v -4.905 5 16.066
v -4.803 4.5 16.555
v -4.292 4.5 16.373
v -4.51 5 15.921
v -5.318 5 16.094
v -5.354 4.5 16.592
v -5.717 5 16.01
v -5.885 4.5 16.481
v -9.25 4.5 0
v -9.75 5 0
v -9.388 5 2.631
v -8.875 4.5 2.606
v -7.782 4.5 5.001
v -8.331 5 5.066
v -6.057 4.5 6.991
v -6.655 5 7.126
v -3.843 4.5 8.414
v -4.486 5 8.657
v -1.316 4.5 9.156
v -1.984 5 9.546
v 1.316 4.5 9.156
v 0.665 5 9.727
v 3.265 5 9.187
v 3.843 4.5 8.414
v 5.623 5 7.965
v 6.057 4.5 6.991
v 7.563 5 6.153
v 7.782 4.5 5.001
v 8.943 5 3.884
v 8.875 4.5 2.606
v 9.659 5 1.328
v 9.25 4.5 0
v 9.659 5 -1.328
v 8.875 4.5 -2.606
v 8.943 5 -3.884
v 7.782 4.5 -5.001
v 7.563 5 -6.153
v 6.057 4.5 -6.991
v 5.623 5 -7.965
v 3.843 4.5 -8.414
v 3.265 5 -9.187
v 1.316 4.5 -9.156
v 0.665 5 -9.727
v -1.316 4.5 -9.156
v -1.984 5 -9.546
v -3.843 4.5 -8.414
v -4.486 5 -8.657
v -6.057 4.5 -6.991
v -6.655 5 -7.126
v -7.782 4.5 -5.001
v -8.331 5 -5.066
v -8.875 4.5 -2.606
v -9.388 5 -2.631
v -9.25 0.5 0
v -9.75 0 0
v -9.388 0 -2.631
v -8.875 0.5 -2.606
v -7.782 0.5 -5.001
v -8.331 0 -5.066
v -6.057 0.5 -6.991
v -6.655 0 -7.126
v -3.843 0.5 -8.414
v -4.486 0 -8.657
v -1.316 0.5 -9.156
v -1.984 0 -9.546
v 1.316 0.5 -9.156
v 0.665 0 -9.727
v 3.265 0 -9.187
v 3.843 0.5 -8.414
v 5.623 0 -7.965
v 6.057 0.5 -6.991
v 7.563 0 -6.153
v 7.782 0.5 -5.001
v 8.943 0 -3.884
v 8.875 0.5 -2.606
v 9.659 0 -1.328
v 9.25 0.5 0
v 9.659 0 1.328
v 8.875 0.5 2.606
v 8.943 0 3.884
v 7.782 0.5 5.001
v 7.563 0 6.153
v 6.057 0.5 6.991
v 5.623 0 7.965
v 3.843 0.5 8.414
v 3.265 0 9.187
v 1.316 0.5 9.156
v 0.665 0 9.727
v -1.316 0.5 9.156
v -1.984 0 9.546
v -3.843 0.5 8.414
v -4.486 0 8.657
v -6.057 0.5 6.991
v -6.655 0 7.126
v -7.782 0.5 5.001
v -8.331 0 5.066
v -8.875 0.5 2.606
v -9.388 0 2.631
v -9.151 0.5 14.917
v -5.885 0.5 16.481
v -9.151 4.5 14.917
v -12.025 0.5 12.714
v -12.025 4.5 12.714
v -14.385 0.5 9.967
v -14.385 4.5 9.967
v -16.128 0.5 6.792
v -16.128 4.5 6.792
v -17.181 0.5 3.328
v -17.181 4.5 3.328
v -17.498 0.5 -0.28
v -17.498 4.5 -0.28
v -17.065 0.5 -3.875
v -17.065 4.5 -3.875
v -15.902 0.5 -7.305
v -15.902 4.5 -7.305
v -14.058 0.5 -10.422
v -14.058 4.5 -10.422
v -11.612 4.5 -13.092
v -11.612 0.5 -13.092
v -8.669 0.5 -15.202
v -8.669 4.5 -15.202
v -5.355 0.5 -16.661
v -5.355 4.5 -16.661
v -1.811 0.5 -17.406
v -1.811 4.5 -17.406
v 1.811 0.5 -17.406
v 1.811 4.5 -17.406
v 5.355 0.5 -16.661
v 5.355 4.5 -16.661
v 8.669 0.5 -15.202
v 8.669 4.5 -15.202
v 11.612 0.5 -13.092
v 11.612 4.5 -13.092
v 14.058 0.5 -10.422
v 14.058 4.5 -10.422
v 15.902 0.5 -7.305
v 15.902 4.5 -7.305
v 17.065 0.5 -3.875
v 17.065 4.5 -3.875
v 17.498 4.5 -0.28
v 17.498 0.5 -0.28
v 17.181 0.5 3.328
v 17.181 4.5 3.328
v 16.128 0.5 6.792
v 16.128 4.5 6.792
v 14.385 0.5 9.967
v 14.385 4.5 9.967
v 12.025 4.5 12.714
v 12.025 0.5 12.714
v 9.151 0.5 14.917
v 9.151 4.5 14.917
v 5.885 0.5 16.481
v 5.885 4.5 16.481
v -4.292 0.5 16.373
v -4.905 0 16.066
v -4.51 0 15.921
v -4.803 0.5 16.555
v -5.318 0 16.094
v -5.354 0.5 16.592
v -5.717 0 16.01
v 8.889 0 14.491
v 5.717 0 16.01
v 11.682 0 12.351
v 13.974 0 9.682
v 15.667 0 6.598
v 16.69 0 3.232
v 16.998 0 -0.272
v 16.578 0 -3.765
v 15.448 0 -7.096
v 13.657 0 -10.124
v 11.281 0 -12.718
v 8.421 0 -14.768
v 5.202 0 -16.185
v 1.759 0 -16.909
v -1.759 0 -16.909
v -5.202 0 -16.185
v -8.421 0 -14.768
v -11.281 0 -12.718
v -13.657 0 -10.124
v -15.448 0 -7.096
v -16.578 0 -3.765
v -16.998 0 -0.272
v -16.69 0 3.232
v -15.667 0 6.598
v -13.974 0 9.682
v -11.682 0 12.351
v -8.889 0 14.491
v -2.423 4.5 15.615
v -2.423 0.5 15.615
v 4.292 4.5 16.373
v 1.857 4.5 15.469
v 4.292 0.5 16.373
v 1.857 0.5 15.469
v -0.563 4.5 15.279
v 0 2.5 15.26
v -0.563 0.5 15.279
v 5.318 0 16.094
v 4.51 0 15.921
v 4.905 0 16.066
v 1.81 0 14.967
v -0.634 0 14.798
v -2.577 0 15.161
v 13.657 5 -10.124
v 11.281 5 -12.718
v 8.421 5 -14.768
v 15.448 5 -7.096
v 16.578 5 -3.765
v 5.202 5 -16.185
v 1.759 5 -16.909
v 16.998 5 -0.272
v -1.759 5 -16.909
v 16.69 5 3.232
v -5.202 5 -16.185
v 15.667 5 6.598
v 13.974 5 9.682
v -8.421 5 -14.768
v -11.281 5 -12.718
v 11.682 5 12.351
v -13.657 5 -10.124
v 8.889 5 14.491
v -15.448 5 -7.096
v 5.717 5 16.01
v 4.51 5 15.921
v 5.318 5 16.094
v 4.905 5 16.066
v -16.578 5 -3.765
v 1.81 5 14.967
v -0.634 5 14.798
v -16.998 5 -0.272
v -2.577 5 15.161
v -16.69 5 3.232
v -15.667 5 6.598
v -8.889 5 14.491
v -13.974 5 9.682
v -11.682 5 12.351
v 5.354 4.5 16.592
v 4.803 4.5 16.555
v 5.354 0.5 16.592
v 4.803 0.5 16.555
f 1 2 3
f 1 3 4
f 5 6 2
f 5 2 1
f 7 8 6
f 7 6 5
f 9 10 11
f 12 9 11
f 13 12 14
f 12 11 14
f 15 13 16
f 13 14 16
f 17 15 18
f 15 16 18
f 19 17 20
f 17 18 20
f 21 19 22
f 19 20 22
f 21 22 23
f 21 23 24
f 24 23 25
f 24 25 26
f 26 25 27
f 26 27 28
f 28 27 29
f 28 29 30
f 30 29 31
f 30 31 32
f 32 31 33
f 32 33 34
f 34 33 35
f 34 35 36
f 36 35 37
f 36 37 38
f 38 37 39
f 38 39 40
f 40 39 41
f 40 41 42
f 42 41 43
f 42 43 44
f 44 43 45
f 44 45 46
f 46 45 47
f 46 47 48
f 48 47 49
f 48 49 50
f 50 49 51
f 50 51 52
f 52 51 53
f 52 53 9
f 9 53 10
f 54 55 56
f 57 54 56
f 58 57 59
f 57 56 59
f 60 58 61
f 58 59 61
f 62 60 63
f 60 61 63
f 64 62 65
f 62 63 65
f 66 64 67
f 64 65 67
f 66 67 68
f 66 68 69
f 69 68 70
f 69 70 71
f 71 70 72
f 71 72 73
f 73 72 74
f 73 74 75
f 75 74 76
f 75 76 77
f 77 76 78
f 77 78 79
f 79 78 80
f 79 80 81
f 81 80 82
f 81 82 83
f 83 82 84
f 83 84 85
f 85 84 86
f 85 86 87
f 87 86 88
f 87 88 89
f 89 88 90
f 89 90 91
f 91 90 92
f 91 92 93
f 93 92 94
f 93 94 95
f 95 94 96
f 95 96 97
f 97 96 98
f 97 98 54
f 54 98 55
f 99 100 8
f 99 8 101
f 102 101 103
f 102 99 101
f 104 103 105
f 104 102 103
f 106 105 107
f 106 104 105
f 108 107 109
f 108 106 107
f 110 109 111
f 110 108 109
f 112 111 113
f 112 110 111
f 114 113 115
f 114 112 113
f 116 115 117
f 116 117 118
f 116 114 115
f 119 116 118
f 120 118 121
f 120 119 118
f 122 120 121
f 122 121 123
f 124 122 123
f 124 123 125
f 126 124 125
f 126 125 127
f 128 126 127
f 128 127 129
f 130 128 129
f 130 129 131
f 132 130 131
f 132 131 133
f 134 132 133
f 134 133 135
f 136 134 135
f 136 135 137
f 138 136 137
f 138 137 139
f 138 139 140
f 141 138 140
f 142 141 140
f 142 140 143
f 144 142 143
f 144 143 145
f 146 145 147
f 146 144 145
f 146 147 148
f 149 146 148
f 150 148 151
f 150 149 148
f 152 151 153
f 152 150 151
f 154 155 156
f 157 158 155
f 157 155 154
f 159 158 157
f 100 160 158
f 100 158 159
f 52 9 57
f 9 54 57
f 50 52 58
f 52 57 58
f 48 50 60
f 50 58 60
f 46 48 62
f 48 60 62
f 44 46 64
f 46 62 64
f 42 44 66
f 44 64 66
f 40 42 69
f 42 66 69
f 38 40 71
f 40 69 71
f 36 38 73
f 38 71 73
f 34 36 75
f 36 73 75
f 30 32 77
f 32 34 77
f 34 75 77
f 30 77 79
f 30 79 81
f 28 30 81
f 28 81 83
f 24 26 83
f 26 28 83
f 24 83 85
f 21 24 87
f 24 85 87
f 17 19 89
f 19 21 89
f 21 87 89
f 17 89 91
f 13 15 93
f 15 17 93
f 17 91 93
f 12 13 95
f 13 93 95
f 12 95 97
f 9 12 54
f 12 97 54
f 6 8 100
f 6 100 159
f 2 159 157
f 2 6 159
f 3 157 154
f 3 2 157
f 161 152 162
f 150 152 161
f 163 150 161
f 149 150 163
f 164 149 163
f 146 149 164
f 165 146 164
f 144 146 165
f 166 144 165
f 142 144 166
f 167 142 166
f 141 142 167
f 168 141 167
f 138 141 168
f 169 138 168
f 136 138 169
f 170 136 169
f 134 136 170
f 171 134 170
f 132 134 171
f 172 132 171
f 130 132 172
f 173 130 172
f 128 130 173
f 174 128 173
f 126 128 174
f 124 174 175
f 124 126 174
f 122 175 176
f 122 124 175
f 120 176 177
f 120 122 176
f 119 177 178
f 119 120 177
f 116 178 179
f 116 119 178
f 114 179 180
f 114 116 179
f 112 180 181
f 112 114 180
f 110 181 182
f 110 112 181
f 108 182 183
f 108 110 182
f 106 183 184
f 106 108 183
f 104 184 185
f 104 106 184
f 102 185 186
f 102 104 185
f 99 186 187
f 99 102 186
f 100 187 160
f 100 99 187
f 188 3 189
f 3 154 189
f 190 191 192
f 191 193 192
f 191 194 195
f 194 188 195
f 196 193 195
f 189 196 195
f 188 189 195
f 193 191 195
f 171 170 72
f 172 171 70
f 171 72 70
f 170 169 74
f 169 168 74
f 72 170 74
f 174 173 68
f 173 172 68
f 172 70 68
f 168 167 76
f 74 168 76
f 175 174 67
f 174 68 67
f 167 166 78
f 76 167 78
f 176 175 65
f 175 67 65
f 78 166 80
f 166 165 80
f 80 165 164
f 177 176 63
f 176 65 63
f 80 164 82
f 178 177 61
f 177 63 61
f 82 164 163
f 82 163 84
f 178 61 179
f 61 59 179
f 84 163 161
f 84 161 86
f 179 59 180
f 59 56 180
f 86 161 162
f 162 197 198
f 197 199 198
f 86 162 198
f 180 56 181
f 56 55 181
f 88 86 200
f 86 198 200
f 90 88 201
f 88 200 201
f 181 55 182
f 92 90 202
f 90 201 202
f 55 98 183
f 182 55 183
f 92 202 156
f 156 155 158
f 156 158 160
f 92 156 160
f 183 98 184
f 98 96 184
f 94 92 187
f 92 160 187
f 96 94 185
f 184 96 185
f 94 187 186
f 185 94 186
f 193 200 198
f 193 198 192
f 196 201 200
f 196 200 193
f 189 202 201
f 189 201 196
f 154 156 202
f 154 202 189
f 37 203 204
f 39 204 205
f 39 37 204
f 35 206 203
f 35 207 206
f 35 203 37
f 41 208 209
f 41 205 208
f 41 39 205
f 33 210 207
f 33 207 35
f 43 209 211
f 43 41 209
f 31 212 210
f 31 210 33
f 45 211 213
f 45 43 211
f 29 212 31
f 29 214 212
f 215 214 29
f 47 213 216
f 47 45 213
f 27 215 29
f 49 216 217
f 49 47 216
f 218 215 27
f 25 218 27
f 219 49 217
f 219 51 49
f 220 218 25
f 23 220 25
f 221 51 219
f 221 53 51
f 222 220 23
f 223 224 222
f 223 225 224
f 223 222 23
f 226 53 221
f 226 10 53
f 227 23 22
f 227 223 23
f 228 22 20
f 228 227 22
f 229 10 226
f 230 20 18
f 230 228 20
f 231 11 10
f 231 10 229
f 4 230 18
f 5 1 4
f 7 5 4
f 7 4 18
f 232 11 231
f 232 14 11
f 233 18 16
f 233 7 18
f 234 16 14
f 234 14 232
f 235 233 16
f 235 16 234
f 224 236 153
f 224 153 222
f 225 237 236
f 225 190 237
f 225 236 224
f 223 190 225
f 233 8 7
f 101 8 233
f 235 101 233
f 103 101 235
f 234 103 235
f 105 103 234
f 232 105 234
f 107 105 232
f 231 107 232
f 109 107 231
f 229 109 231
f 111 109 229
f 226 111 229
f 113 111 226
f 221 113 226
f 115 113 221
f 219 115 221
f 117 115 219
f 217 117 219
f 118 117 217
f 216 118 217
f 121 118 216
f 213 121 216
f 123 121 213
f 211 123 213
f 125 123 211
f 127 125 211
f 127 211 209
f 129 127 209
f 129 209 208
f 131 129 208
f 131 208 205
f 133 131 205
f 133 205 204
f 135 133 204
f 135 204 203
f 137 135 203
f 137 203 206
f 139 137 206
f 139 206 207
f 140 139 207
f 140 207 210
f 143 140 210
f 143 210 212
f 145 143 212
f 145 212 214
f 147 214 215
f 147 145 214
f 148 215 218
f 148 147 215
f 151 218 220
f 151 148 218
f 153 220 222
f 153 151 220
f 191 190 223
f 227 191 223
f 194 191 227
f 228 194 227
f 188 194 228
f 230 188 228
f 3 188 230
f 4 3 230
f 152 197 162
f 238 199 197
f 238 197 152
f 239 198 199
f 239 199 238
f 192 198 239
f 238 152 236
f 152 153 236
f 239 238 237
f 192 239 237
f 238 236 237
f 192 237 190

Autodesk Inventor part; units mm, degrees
ref_plane "YZ Plane" through (0, 0, 0) normal (1, 0, 0) x (0, 1, 0)
ref_plane "XZ Plane" through (0, 0, 0) normal (0, 1, 0) x (-1, 0, 0)
ref_plane "XY Plane" through (0, 0, 0) normal (0, 0, 1) x (1, 0, 0)
sketch "Sketch1" plane through (0, 0, 0) normal (0, 1, 0) x (-1, 0, 0)
  circle A0 centre (0, 0) radius 9.25
  circle A1 centre (0, 0) radius 13.75 construction
  circle A2 centre (9.7227, -9.7227) radius 1.7
  line L0 (9.7227, -9.7227) -> (0, 0) construction
  circle A3 centre (9.7227, 9.7227) radius 1.7
  circle A4 centre (-9.7227, 9.7227) radius 1.7
  circle A5 centre (-9.7227, -9.7227) radius 1.7
  line L1 (0, 0) -> (0, -13.75) construction
  circle A6 centre (0, 0) radius 17.5
  circle A7 centre (0, 0) radius 10 construction
  line L2 (5, 16.7705) -> (0, 13.75) construction
  line L3 (0, 13.75) -> (-5, 16.7705) construction
  spline S0 degree 2 poles (5, 16.7705) (0, 13.75) (-5, 16.7705) knots 1 1 1 2 2 2
  line L4 (5, 16.7705) -> (-5, 16.7705) construction
  line L5 (0, 13.75) -> (0, 10) construction
  dimension "d10" = 20
  dimension "d0" = 18.5
  dimension "d2" = 3.4
  dimension "d6" = 360
  dimension "d8" = 45
  dimension "d11" = 10
  dimension "d30" = 7.5
  dimension "d31" = 3.75
extrude "Extrusion1" add sketch "Sketch1" along normal blind 5 contours A2 | A3 | A4 | A5 | A6 S0 picked at (12.2147, -4.9313)
fillet "Fillet1" radius 2 2 edges at (-5, 2.5, 16.7705) (5, 2.5, 16.7705)
chamfer "Chamfer1" distance 0.5 angle 45 2 edges at (9.25, 5, 0) (9.25, 0, 0)
chamfer "Chamfer2" distance 0.5 angle 45 8 edges at (0, 5, -17.5) (-5.0769, 5, 16.5928) (0, 5, 15.2603) (5.0769, 5, 16.5928) (0, 0, -17.5) (-5.0769, 0, 16.5928) (0, 0, 15.2603) (5.0769, 0, 16.5928)
properties part number "Motor Mount" material "ABS Plastic"
